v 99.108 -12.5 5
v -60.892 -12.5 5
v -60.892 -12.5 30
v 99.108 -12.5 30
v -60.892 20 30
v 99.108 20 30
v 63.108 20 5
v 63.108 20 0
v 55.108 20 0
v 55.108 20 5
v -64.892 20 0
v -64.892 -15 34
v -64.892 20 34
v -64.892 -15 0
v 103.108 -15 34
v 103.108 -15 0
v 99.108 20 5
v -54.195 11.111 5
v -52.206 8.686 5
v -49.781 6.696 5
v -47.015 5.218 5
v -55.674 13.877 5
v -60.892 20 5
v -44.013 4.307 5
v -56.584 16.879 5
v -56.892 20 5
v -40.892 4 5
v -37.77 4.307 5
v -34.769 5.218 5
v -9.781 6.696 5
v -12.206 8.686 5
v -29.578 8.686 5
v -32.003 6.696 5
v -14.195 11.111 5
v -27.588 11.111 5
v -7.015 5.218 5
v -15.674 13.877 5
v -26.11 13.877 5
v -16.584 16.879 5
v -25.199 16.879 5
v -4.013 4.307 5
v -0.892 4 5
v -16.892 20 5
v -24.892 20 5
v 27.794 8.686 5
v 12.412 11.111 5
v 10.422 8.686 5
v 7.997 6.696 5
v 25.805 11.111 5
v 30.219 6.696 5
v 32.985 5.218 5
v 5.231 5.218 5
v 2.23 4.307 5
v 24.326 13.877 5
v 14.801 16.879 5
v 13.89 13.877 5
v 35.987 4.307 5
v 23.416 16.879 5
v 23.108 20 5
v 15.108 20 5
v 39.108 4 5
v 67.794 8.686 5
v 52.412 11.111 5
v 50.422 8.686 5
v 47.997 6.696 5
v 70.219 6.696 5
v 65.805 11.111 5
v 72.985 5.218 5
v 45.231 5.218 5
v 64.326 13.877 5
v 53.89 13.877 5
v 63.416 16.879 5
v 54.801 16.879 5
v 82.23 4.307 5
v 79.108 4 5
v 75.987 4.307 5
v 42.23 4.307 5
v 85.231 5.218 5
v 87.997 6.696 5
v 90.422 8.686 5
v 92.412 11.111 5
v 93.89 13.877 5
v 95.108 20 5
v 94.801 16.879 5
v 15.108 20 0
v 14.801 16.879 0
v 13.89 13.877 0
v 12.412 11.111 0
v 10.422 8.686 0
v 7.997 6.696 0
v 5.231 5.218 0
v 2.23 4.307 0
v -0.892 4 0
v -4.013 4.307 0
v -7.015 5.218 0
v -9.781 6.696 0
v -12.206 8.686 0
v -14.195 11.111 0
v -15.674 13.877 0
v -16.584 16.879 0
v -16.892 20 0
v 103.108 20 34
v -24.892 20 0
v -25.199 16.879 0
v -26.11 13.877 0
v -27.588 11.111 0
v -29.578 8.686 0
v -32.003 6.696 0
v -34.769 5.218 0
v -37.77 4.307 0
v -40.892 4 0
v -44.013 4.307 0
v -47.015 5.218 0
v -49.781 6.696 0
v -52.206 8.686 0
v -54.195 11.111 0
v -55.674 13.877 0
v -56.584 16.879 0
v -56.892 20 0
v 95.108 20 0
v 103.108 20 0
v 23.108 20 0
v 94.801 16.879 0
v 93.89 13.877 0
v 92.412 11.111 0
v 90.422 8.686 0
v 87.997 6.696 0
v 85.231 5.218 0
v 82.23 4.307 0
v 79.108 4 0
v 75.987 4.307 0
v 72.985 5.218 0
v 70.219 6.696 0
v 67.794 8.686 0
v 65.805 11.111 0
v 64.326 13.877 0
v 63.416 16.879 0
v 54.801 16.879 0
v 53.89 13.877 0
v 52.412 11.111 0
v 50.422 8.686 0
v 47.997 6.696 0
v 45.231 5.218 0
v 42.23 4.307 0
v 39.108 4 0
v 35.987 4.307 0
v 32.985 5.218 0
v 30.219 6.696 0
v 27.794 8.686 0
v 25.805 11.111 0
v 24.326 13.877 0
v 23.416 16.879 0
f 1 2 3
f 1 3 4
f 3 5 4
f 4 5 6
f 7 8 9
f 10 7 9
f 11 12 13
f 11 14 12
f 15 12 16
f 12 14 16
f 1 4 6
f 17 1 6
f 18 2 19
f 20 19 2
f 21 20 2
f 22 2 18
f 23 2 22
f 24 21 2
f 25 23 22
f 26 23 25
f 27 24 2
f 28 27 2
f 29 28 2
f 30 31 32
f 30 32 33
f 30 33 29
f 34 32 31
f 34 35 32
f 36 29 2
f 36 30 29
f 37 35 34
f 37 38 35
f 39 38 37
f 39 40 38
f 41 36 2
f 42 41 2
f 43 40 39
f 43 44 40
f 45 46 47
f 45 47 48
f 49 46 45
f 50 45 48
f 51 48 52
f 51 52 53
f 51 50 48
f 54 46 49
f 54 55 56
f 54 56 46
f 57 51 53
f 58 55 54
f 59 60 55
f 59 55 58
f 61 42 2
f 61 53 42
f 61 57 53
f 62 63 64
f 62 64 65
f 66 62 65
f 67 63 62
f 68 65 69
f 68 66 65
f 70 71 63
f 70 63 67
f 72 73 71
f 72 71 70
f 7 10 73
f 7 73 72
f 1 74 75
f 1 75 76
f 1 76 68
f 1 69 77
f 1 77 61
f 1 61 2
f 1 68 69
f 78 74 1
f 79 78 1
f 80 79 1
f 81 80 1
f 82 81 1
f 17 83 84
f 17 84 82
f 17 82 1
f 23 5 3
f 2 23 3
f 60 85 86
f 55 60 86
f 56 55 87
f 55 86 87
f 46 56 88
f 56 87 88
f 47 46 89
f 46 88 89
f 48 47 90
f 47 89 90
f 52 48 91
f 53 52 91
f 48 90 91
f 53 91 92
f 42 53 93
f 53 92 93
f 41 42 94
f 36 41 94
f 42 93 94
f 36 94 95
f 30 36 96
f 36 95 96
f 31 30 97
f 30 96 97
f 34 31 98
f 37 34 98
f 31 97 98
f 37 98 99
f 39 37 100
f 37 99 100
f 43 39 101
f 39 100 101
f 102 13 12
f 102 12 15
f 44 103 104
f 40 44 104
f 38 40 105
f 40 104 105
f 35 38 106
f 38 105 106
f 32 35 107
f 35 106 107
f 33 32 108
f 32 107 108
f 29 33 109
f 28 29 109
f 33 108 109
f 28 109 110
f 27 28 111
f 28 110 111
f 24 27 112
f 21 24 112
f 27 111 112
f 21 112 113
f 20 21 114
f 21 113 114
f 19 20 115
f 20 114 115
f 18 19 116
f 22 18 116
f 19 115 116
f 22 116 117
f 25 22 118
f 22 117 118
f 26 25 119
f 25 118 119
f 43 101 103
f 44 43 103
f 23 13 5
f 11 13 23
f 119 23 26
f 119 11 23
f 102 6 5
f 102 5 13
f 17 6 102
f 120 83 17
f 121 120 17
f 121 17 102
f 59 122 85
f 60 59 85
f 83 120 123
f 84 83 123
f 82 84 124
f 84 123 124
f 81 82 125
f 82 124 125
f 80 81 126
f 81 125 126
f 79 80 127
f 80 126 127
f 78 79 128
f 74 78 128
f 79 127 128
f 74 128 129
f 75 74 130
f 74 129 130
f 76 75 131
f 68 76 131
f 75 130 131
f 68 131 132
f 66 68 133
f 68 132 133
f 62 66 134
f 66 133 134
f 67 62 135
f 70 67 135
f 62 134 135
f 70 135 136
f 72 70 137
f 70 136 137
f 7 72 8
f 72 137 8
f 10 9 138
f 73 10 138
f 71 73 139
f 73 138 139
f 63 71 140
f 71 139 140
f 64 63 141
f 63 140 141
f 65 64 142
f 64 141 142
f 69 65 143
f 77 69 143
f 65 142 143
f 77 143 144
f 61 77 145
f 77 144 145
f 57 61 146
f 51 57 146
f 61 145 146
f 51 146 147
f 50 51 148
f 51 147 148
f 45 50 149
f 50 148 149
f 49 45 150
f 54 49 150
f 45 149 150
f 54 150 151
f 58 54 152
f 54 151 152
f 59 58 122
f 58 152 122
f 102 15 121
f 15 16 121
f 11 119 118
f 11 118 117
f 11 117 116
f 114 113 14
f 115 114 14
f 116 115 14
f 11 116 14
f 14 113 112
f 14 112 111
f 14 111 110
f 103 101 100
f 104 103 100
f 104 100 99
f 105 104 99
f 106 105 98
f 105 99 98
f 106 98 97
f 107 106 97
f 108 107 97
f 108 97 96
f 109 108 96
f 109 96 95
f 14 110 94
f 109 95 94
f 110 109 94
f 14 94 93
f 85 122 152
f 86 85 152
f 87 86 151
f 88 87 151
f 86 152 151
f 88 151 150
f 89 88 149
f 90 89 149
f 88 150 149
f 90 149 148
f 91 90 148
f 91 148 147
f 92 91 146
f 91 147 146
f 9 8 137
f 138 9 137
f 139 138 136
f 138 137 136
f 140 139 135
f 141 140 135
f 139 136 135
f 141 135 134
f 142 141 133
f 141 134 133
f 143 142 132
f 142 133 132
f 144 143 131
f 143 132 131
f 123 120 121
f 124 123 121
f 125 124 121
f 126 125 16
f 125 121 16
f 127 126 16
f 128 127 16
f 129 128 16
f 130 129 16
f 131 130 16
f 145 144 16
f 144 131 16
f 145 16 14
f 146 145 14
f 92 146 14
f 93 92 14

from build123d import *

# Parameters (mm, degrees)
F1_DEPTH = 5
F2_W     = 160
F2_H     = 2.5
F3_DEPTH = 25
F4_W     = 35
F4_H     = 30
F5_DEPTH = 4
F6_W     = 35
F6_H     = 30
F7_DEPTH = 4
F8_W     = 168
F8_H     = 35
F9_DEPTH = 4


with BuildPart() as f1:
    # F0 (on Top) → F1 (new body)
    with BuildSketch(Plane.XY):
        with BuildLine():
            Line((-60.891874, 20), (-60.891874, 0))
            Line((-60.891874, 0), (-60.891874, -15))
            Line((-60.891874, -15), (99.108126, -15))
            Line((99.108126, -15), (99.108126, 0))
            Line((99.108126, 0), (99.108126, 20))
            Line((99.108126, 20), (95.108126, 20))
            ThreePointArc((95.108126, 20), (79.108126, 4), (63.108126, 20))
            Line((63.108126, 20), (55.108126, 20))
            ThreePointArc((55.108126, 20), (39.108126, 4), (23.108126, 20))
            Line((23.108126, 20), (15.108126, 20))
            ThreePointArc((15.108126, 20), (-0.891874, 4), (-16.891874, 20))
            Line((-16.891874, 20), (-24.891874, 20))
            ThreePointArc((-24.891874, 20), (-40.891874, 4), (-56.891874, 20))
            Line((-56.891874, 20), (-60.891874, 20))
        make_face()
    extrude(amount=F1_DEPTH)

    # F2 (on face) → F3 (join)
    with BuildSketch(Plane.XY.offset(5)):
        with Locations((19.108126, -13.75)):
            Rectangle(F2_W, F2_H)
    extrude(amount=F3_DEPTH)

    # F4 (on face) → F5 (join)
    with BuildSketch(Plane.YZ.offset(99.108126)):
        with Locations((2.5, 15)):
            Rectangle(F4_W, F4_H)
    extrude(amount=F5_DEPTH)

    # F6 (on face) → F7 (join)
    with BuildSketch(Plane(origin=(-60.891874, 0, 0), x_dir=(0, -1, 0), z_dir=(-1, 0, 0))):
        with Locations((-2.5, 15)):
            Rectangle(F6_W, F6_H)
    extrude(amount=F7_DEPTH)

    # F8 (on face) → F9 (join)
    with BuildSketch(Plane.XY.offset(30)):
        with Locations((19.108126, 2.5)):
            Rectangle(F8_W, F8_H)
    extrude(amount=F9_DEPTH)


solid = f1.part
